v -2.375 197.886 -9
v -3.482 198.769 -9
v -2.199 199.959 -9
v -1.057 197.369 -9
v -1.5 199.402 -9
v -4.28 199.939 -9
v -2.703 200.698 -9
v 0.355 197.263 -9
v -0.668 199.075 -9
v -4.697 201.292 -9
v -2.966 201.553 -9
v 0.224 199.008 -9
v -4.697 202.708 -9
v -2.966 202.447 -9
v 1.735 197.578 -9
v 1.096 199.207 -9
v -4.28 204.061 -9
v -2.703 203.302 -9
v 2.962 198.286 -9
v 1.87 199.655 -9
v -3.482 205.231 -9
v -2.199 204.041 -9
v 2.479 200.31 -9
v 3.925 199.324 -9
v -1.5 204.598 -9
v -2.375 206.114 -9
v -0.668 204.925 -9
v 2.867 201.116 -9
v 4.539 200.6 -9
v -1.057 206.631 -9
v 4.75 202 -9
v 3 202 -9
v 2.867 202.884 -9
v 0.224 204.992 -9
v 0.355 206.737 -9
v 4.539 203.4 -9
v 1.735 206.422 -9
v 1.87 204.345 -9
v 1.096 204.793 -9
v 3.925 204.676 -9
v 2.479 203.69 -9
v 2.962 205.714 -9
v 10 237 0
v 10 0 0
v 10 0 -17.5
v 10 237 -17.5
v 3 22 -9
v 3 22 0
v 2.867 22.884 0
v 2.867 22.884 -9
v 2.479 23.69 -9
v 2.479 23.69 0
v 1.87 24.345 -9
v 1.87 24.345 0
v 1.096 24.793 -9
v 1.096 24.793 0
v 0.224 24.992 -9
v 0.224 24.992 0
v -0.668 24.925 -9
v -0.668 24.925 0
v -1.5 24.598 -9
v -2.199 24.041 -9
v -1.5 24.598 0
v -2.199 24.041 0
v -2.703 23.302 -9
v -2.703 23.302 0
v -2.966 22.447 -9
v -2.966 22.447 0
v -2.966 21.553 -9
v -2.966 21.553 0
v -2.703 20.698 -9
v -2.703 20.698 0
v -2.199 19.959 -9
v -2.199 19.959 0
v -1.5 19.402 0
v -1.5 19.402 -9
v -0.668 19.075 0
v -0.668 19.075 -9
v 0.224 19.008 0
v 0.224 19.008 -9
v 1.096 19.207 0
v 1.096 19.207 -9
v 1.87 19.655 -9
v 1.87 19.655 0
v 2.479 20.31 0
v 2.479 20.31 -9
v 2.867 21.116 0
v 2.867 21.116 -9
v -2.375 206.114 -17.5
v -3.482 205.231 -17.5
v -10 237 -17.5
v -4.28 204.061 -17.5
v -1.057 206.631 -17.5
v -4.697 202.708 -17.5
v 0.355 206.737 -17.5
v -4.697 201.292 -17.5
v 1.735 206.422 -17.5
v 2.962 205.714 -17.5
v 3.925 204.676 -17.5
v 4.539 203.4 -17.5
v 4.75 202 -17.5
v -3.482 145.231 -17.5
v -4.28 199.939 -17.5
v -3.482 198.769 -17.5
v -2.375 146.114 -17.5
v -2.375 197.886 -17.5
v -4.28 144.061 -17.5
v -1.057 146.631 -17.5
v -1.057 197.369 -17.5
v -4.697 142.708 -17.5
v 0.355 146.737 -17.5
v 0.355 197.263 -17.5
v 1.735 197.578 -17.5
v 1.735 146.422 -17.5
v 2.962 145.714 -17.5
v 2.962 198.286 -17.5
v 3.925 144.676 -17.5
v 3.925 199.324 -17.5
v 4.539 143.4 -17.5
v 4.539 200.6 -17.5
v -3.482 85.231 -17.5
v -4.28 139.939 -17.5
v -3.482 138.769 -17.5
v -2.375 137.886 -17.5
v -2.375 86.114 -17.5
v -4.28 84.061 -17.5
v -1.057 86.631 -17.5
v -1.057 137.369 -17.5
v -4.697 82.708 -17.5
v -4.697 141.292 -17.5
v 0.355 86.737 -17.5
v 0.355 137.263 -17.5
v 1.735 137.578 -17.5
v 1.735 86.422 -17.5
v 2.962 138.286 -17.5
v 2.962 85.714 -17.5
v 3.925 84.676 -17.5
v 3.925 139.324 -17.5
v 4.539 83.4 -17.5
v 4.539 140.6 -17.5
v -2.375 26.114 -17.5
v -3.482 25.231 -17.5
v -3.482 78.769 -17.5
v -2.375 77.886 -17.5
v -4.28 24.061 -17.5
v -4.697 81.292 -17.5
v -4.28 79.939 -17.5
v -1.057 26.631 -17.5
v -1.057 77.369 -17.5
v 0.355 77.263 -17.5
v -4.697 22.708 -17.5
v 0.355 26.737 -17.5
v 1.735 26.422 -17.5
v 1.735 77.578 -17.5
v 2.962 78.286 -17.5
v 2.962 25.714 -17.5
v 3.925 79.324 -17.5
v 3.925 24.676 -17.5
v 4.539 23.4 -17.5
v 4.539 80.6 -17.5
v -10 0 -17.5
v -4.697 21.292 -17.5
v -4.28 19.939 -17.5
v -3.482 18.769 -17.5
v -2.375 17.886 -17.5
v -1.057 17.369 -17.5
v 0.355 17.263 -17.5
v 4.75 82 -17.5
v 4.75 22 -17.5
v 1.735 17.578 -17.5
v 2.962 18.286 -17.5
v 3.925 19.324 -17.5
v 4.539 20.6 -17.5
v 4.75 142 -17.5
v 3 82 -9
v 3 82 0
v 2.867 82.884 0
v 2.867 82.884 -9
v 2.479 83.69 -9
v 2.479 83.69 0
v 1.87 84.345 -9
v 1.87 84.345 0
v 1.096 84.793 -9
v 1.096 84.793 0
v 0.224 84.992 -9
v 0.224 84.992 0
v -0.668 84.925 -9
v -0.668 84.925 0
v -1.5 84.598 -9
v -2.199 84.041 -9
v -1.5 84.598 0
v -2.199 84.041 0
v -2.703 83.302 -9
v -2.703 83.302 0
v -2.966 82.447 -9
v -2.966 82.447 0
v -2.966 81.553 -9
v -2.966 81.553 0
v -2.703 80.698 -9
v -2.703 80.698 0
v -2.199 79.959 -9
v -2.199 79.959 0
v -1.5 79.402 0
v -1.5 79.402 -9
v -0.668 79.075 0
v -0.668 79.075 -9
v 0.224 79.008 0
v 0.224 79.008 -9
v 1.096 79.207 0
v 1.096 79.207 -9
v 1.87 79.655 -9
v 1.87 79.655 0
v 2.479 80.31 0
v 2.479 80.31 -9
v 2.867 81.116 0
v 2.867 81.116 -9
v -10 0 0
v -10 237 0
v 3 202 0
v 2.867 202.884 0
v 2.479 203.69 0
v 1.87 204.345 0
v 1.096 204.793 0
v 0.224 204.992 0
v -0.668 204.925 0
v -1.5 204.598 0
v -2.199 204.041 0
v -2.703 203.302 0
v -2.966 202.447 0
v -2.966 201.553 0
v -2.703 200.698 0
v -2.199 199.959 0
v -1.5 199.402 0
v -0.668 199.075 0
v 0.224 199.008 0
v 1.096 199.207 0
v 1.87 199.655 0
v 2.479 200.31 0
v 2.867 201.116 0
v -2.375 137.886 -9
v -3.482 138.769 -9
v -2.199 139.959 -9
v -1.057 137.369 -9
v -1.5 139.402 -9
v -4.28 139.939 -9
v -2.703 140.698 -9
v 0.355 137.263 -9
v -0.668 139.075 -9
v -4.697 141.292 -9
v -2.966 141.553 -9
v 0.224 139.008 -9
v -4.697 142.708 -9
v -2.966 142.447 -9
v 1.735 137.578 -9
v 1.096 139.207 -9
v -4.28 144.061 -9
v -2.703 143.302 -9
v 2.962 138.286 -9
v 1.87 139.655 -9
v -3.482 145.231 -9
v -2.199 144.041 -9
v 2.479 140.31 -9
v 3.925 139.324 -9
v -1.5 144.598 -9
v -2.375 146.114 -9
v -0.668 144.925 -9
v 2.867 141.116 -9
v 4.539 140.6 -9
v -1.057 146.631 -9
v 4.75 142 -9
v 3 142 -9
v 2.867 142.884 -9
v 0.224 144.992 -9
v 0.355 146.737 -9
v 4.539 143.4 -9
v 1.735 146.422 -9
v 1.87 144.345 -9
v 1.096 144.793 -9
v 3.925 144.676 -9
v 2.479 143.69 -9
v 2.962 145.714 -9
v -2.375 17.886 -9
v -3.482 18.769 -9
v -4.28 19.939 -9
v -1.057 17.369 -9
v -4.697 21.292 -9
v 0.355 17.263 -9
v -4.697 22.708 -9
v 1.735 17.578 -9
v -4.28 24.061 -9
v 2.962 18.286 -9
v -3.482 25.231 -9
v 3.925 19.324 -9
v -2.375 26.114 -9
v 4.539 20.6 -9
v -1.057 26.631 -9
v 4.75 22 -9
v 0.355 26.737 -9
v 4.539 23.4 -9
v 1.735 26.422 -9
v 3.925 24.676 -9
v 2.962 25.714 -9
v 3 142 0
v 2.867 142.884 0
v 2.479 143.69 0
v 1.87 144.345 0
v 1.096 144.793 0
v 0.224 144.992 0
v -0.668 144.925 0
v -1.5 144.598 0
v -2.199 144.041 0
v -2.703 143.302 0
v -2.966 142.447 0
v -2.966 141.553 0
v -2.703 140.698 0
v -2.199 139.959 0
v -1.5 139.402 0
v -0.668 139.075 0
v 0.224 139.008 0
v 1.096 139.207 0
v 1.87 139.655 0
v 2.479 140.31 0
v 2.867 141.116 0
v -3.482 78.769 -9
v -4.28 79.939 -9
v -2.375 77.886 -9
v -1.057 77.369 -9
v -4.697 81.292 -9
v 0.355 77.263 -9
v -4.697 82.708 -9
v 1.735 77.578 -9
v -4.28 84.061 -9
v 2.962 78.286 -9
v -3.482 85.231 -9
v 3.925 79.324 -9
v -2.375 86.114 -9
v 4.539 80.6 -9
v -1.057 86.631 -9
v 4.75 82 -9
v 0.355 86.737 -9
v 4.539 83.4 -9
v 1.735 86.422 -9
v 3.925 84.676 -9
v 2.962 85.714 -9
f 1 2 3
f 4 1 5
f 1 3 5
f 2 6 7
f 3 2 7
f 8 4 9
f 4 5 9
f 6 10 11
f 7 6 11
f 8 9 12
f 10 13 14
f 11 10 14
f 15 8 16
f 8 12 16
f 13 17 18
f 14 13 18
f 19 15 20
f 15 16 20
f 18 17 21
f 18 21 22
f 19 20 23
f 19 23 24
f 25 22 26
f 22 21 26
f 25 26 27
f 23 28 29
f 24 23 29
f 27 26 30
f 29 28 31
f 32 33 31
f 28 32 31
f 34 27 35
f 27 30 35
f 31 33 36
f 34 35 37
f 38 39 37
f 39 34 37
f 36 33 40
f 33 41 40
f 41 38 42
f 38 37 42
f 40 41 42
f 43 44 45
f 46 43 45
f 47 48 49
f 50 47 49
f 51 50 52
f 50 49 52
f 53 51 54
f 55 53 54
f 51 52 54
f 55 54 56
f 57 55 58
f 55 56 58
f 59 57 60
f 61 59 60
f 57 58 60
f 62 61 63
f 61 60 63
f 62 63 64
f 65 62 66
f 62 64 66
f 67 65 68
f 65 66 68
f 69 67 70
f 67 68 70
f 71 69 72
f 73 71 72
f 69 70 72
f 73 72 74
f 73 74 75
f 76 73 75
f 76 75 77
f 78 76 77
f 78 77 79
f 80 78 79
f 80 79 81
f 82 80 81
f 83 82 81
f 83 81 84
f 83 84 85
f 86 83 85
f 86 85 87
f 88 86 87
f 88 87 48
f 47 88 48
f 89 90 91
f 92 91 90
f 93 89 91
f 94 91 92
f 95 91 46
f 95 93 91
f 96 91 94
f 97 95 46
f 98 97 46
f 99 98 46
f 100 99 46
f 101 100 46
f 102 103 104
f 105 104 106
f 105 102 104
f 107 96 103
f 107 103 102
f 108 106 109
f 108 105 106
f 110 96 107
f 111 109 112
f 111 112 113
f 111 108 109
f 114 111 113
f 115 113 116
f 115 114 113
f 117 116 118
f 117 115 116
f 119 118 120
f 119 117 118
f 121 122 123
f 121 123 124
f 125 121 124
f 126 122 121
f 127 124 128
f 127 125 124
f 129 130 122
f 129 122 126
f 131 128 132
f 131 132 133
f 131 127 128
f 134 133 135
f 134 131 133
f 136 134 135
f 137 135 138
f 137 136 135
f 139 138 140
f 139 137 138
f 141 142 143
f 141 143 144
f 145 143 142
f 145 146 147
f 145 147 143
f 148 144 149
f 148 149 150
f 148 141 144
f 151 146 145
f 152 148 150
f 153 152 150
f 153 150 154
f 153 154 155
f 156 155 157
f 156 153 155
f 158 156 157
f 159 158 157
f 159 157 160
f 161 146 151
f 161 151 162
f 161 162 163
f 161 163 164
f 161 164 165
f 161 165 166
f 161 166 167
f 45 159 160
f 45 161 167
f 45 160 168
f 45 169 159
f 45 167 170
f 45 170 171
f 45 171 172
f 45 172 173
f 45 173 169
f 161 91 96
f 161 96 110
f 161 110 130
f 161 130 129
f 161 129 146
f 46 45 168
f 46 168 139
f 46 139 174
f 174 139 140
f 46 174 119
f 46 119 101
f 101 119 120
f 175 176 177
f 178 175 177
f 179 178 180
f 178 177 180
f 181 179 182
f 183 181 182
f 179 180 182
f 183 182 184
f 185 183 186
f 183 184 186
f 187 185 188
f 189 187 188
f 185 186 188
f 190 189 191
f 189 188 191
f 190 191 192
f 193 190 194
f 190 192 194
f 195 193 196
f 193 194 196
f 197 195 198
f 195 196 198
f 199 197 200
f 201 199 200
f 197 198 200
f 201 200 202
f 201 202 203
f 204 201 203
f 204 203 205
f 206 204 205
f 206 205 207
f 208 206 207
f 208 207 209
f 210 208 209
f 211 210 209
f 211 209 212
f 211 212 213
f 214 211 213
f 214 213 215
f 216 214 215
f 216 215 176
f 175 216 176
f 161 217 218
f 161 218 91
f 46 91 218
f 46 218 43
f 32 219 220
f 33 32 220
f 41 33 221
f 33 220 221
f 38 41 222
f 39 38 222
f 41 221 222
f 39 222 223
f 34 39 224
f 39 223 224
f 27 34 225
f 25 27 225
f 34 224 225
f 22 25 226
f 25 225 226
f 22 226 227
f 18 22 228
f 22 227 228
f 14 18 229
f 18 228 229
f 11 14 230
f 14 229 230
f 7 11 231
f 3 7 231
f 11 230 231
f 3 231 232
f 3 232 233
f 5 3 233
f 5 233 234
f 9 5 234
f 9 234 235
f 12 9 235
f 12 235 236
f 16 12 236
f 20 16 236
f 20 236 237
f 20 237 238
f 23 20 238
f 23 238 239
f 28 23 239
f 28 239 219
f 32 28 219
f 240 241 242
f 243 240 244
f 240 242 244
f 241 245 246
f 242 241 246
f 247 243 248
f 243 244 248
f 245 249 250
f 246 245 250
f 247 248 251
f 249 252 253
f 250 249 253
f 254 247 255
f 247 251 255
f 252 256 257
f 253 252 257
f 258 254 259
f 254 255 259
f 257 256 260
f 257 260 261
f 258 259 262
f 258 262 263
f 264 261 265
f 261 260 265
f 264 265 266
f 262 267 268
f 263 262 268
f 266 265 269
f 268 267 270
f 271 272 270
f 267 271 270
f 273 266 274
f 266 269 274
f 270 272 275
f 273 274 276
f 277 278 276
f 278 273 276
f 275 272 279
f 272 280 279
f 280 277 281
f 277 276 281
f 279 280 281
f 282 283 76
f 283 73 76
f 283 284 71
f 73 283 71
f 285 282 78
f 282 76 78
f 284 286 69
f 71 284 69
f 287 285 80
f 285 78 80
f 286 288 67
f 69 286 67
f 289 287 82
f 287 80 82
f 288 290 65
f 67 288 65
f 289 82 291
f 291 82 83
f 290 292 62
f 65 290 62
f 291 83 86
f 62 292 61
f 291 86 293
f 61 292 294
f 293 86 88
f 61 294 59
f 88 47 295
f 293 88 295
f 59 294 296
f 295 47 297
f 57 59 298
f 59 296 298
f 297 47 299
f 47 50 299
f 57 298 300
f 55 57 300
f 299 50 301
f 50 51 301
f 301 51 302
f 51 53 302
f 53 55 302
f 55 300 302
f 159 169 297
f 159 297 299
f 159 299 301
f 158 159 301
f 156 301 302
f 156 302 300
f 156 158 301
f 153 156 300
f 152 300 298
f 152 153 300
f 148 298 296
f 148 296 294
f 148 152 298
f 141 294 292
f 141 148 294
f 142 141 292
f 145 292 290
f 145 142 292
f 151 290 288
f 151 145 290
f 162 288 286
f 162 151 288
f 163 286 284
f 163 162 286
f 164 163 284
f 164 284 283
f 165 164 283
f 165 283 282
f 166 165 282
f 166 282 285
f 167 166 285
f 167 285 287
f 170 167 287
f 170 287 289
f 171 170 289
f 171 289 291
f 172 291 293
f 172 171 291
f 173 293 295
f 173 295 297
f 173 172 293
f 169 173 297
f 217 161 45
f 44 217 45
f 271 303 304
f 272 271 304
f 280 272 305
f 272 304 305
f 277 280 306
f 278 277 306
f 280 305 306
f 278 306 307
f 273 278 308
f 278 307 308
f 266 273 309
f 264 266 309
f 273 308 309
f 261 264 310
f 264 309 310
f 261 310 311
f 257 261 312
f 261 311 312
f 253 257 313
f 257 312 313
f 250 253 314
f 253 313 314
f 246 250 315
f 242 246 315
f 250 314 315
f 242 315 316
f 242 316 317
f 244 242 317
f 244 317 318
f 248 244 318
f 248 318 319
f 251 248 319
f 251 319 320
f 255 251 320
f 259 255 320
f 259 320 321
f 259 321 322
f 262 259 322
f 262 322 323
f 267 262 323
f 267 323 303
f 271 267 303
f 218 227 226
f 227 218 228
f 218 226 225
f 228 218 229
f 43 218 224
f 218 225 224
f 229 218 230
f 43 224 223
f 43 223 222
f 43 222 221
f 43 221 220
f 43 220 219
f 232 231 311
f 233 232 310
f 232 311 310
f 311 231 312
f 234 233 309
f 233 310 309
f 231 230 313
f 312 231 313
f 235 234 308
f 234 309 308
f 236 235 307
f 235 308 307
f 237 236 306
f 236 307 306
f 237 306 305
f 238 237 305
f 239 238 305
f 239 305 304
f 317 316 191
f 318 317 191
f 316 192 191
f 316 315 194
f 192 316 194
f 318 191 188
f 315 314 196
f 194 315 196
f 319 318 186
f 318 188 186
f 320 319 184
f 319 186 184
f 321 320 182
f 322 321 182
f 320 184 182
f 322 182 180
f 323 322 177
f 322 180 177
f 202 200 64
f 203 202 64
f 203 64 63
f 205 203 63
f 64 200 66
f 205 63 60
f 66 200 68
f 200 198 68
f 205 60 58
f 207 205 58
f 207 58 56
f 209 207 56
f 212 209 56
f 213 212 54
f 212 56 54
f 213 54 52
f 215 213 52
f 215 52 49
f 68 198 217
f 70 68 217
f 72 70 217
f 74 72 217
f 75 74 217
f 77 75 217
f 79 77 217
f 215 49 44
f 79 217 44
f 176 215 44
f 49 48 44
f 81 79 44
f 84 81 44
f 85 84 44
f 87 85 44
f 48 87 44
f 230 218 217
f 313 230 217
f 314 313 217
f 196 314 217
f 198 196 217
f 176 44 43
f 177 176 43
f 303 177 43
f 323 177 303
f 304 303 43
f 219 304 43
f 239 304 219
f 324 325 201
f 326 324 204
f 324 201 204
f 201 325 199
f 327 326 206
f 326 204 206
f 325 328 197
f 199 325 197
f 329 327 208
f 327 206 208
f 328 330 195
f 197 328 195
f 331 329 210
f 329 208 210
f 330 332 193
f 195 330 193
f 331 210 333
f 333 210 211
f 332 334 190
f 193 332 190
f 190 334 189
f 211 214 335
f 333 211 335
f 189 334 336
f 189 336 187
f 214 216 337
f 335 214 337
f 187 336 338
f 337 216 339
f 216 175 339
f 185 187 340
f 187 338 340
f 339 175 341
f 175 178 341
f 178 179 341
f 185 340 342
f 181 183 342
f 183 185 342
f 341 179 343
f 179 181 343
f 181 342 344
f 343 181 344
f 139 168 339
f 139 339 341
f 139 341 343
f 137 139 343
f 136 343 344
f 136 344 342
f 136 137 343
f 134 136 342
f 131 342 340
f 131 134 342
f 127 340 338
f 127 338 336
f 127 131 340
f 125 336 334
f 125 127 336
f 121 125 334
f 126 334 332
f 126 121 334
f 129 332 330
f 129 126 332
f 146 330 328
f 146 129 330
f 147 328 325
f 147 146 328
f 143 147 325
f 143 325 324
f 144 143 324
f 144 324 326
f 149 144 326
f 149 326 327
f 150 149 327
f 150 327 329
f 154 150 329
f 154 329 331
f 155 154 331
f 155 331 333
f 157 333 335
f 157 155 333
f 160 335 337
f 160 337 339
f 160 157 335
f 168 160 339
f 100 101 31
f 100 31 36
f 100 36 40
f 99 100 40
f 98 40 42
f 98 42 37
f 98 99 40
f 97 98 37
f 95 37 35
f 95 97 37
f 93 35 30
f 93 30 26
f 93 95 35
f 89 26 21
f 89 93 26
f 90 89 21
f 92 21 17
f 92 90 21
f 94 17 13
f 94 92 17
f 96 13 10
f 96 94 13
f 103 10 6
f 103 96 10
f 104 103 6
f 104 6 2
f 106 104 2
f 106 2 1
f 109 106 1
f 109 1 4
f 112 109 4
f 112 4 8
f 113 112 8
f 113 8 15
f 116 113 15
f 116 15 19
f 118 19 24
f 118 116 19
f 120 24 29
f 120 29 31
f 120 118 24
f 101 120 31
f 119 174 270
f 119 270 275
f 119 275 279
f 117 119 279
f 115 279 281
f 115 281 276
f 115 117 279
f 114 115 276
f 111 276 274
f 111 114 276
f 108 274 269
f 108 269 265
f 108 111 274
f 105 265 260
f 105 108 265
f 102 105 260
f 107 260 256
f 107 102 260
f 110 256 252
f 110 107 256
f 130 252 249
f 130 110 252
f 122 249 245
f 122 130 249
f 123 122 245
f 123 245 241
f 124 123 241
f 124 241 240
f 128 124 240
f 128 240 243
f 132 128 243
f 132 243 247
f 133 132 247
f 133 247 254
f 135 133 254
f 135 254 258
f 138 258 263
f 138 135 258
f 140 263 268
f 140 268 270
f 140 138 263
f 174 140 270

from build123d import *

# Parameters (mm, degrees)
SKETCH_1_W          = 20
SKETCH_1_H          = 17.5
EXTRUDE_1_DEPTH     = 237
SKETCH_2_R          = 3
CUT_EXTRUDE_1_DEPTH = 238.855523375
CUT_EXTRUDE_START   = -17.5
SKETCH_3_R          = 4.75
CUT_EXTRUDE_2_DEPTH = 8.5


with BuildPart() as part:
    # 草图1 → 凸台-拉伸1 (new body)
    with BuildSketch(Plane(origin=(0, 0, 0), x_dir=(1, 0, 0), z_dir=(0, 1, 0))):
        with Locations((0, 8.75)):
            Rectangle(SKETCH_1_W, SKETCH_1_H)
    extrude(amount=EXTRUDE_1_DEPTH)

    # 草图2 → 切除-拉伸1 (cut, through all)
    with BuildSketch(Plane.XY):
        with Locations((0, 22)):
            Circle(SKETCH_2_R)
        with Locations((0, 82)):
            Circle(SKETCH_2_R)
        with Locations((0, 142)):
            Circle(SKETCH_2_R)
        with Locations((0, 202)):
            Circle(SKETCH_2_R)
        with Locations((0, 262)):
            Circle(SKETCH_2_R)
    extrude(amount=-CUT_EXTRUDE_1_DEPTH, mode=Mode.SUBTRACT)

    # 草图3 → 切除-拉伸2 (cut)
    with BuildSketch(Plane.XY.offset(CUT_EXTRUDE_START)):
        with Locations((0, 22)):
            Circle(SKETCH_3_R)
        with Locations((0, 82)):
            Circle(SKETCH_3_R)
        with Locations((0, 142)):
            Circle(SKETCH_3_R)
        with Locations((0, 202)):
            Circle(SKETCH_3_R)
        with Locations((0, 262)):
            Circle(SKETCH_3_R)
    extrude(amount=CUT_EXTRUDE_2_DEPTH, mode=Mode.SUBTRACT)


solid = part.part
